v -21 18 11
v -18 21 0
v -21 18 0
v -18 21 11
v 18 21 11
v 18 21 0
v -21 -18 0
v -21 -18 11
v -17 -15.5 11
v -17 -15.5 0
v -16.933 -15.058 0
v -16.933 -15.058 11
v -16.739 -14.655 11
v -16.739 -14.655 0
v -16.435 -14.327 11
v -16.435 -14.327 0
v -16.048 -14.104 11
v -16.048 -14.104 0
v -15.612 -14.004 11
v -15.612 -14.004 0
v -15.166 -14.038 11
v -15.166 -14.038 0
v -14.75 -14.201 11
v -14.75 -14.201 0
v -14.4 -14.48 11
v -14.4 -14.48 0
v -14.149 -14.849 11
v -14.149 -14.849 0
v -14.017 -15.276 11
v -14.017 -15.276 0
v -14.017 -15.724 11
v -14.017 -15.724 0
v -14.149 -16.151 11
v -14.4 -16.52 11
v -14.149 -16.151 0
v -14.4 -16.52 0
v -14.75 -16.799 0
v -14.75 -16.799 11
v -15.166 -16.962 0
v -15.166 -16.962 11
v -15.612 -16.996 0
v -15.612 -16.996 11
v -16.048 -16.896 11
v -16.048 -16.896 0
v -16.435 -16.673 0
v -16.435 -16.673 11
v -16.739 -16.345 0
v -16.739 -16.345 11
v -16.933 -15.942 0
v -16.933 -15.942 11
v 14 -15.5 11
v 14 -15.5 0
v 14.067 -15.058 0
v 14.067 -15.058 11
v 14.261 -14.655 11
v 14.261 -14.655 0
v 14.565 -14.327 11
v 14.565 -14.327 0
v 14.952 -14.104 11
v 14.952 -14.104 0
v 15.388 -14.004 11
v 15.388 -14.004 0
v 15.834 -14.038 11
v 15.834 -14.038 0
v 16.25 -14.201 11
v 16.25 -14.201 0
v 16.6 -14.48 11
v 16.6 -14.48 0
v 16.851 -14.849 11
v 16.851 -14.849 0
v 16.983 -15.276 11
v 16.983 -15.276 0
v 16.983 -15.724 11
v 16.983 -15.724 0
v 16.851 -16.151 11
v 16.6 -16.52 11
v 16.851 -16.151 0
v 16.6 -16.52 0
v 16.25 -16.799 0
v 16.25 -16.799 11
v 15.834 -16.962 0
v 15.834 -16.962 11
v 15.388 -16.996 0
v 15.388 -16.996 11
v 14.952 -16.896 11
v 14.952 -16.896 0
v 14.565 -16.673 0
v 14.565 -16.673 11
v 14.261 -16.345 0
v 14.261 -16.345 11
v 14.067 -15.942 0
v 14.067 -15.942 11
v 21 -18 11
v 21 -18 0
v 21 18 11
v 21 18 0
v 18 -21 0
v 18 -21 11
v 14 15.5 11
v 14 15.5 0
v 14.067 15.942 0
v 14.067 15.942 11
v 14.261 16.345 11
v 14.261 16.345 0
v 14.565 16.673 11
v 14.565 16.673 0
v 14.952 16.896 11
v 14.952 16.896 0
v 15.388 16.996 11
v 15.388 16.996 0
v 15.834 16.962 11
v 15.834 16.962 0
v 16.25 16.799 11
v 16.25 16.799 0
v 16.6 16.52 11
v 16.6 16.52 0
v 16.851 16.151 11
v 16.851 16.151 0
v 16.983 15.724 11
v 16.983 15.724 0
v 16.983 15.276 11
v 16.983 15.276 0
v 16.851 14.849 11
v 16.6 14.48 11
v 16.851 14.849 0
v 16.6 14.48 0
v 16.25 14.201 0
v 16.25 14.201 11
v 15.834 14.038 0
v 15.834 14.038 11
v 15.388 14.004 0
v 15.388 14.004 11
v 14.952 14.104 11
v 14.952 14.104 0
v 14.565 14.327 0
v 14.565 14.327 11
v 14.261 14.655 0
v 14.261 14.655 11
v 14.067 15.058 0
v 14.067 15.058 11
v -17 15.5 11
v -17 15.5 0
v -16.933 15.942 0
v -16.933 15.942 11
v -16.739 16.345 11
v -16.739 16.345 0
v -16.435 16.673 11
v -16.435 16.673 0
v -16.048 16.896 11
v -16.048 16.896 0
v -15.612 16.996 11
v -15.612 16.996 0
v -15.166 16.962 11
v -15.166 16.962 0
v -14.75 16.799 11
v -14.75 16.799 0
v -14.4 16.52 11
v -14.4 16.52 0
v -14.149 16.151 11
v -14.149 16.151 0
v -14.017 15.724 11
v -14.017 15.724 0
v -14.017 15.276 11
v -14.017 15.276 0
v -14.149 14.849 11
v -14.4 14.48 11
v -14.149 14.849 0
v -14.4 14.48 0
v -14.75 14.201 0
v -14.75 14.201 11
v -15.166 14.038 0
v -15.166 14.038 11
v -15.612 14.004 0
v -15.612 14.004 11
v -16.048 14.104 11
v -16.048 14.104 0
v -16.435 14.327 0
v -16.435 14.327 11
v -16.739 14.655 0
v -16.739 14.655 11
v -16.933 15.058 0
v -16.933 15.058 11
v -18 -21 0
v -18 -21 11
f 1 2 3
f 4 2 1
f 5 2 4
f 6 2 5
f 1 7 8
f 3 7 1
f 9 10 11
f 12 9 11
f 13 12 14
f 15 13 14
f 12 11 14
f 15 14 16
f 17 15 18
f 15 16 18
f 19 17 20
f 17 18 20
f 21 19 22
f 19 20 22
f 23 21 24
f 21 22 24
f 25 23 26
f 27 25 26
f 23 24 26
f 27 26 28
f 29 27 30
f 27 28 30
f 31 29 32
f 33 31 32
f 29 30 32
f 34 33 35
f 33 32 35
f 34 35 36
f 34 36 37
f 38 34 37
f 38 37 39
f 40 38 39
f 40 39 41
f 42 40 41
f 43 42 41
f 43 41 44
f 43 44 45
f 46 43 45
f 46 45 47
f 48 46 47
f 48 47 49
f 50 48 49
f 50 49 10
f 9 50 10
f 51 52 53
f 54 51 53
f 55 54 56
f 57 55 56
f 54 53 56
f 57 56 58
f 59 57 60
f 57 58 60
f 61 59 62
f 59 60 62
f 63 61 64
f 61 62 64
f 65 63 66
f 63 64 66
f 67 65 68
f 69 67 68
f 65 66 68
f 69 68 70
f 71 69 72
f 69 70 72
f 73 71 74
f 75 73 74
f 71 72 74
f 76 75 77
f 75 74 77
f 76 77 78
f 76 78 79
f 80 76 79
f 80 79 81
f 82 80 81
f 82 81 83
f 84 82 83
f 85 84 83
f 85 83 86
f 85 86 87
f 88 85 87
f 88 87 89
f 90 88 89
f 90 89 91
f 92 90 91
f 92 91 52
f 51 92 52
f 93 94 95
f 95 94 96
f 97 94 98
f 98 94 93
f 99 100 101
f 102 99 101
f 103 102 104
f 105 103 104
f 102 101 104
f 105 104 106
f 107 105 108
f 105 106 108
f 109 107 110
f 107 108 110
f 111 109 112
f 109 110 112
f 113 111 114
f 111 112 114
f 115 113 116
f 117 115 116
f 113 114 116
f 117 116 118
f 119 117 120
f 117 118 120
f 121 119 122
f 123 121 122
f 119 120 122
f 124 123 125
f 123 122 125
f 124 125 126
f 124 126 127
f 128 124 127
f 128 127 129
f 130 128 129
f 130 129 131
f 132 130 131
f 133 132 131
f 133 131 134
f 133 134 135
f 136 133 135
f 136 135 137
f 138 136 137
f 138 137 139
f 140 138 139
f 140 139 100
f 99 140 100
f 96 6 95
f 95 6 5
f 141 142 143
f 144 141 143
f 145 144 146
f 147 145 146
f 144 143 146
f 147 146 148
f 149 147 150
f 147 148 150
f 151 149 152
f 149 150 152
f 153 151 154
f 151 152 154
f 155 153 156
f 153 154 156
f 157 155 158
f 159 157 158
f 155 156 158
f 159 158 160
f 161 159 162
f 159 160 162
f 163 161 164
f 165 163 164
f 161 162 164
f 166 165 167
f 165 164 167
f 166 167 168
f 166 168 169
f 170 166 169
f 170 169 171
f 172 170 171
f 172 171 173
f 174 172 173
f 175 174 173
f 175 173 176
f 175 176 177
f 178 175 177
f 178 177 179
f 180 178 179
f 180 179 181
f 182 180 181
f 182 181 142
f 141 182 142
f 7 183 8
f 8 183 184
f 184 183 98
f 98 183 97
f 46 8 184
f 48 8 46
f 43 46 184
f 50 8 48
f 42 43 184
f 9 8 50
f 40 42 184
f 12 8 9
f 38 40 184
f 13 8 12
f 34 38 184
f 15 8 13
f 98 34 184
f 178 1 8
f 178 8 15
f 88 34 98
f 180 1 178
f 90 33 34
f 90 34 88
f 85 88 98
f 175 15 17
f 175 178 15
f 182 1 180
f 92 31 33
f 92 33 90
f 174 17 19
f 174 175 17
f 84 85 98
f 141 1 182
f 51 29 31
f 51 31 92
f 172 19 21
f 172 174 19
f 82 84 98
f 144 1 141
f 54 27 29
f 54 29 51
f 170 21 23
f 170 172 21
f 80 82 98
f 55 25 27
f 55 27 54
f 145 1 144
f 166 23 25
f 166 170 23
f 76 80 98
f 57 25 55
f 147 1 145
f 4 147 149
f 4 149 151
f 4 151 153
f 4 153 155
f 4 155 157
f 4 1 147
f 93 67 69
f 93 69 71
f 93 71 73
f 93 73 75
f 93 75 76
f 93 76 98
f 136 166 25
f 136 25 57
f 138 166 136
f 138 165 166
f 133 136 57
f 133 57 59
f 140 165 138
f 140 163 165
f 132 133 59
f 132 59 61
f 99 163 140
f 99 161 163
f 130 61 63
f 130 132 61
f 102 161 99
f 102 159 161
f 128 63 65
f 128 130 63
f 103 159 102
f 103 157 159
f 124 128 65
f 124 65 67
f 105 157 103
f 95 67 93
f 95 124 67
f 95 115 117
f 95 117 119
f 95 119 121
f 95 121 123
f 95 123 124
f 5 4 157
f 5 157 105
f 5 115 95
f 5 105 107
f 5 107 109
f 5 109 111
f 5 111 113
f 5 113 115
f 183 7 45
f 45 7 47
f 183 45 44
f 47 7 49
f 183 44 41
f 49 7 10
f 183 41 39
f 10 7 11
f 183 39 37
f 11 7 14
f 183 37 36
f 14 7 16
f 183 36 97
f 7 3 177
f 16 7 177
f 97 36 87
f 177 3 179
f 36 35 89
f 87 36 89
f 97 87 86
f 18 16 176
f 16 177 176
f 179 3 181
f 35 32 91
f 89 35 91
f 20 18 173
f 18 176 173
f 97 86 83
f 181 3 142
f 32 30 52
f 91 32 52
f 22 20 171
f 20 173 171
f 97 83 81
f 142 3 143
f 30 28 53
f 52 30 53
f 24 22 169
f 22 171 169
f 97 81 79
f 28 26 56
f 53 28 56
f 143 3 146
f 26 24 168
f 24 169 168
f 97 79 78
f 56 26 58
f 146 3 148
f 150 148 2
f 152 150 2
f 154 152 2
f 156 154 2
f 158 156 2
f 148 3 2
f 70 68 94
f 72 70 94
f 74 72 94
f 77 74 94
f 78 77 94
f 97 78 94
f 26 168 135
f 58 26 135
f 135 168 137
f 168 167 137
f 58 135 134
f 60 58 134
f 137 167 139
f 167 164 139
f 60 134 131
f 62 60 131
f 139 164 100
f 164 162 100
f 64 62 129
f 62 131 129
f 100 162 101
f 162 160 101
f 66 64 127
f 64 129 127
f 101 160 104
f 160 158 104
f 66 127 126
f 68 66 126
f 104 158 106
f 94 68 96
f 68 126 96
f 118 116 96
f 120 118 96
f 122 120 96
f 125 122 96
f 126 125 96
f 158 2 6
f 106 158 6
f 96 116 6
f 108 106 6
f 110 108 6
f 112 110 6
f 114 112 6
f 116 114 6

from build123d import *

# Parameters (mm, degrees)
SKETCH1_W           = 42
SKETCH1_H           = 42
BOSS_EXTRUDE1_DEPTH = 11
CHAMFER1_SIZE       = 3
SKETCH4_R           = 11.25
BOSS_EXTRUDE2_DEPTH = 0.5
CUT_EXTRUDE4_REACH  = 33.67
SKETCH8_R           = 1.5


with BuildPart() as part:
    # Sketch1 → Boss-Extrude1 (new body)
    with BuildSketch(Plane.XY):
        Rectangle(SKETCH1_W, SKETCH1_H)
    extrude(amount=BOSS_EXTRUDE1_DEPTH)

    # Chamfer1
    chamfer1_edges = [part.edges().sort_by_distance(p)[0] for p in [
        (-21, 21, 5.5),
        (21, 21, 5.5),
        (21, -21, 5.5),
        (-21, -21, 5.5),
    ]]
    chamfer(chamfer1_edges, length=CHAMFER1_SIZE)

    # Sketch4 → Boss-Extrude2 (add)
    with BuildSketch(Plane(origin=(0, 0, 0), x_dir=(-1, 0, 0), z_dir=(0, 0, -1))):
        Circle(SKETCH4_R)
    extrude(amount=-BOSS_EXTRUDE2_DEPTH)

    # Sketch8 → Cut-Extrude4 (cut, up to next)
    with BuildSketch(Plane(origin=(0, 0, 0), x_dir=(-1, 0, 0), z_dir=(0, 0, -1)), mode=Mode.PRIVATE) as cut_extrude4_sk1:
        with Locations((15.5, 15.5)):
            Circle(SKETCH8_R)
    cut_extrude4_tool1 = extrude(cut_extrude4_sk1.sketch, amount=-CUT_EXTRUDE4_REACH, mode=Mode.PRIVATE) & part.part
    # Sketch8 → Cut-Extrude4 (cut, up to next)
    with BuildSketch(Plane(origin=(0, 0, 0), x_dir=(-1, 0, 0), z_dir=(0, 0, -1)), mode=Mode.PRIVATE) as cut_extrude4_sk2:
        with Locations((-15.5, 15.5)):
            Circle(SKETCH8_R)
    cut_extrude4_tool2 = extrude(cut_extrude4_sk2.sketch, amount=-CUT_EXTRUDE4_REACH, mode=Mode.PRIVATE) & part.part
    # Sketch8 → Cut-Extrude4 (cut, up to next)
    with BuildSketch(Plane(origin=(0, 0, 0), x_dir=(-1, 0, 0), z_dir=(0, 0, -1)), mode=Mode.PRIVATE) as cut_extrude4_sk3:
        with Locations((-15.5, -15.5)):
            Circle(SKETCH8_R)
    cut_extrude4_tool3 = extrude(cut_extrude4_sk3.sketch, amount=-CUT_EXTRUDE4_REACH, mode=Mode.PRIVATE) & part.part
    # Sketch8 → Cut-Extrude4 (cut, up to next)
    with BuildSketch(Plane(origin=(0, 0, 0), x_dir=(-1, 0, 0), z_dir=(0, 0, -1)), mode=Mode.PRIVATE) as cut_extrude4_sk4:
        with Locations((15.5, -15.5)):
            Circle(SKETCH8_R)
    cut_extrude4_tool4 = extrude(cut_extrude4_sk4.sketch, amount=-CUT_EXTRUDE4_REACH, mode=Mode.PRIVATE) & part.part
    add(cut_extrude4_tool1.solids().sort_by_distance((-15.5, 15.5, 0))[0], mode=Mode.SUBTRACT)
    add(cut_extrude4_tool2.solids().sort_by_distance((15.5, 15.5, 0))[0], mode=Mode.SUBTRACT)
    add(cut_extrude4_tool3.solids().sort_by_distance((15.5, -15.5, 0))[0], mode=Mode.SUBTRACT)
    add(cut_extrude4_tool4.solids().sort_by_distance((-15.5, -15.5, 0))[0], mode=Mode.SUBTRACT)


solid = part.part
